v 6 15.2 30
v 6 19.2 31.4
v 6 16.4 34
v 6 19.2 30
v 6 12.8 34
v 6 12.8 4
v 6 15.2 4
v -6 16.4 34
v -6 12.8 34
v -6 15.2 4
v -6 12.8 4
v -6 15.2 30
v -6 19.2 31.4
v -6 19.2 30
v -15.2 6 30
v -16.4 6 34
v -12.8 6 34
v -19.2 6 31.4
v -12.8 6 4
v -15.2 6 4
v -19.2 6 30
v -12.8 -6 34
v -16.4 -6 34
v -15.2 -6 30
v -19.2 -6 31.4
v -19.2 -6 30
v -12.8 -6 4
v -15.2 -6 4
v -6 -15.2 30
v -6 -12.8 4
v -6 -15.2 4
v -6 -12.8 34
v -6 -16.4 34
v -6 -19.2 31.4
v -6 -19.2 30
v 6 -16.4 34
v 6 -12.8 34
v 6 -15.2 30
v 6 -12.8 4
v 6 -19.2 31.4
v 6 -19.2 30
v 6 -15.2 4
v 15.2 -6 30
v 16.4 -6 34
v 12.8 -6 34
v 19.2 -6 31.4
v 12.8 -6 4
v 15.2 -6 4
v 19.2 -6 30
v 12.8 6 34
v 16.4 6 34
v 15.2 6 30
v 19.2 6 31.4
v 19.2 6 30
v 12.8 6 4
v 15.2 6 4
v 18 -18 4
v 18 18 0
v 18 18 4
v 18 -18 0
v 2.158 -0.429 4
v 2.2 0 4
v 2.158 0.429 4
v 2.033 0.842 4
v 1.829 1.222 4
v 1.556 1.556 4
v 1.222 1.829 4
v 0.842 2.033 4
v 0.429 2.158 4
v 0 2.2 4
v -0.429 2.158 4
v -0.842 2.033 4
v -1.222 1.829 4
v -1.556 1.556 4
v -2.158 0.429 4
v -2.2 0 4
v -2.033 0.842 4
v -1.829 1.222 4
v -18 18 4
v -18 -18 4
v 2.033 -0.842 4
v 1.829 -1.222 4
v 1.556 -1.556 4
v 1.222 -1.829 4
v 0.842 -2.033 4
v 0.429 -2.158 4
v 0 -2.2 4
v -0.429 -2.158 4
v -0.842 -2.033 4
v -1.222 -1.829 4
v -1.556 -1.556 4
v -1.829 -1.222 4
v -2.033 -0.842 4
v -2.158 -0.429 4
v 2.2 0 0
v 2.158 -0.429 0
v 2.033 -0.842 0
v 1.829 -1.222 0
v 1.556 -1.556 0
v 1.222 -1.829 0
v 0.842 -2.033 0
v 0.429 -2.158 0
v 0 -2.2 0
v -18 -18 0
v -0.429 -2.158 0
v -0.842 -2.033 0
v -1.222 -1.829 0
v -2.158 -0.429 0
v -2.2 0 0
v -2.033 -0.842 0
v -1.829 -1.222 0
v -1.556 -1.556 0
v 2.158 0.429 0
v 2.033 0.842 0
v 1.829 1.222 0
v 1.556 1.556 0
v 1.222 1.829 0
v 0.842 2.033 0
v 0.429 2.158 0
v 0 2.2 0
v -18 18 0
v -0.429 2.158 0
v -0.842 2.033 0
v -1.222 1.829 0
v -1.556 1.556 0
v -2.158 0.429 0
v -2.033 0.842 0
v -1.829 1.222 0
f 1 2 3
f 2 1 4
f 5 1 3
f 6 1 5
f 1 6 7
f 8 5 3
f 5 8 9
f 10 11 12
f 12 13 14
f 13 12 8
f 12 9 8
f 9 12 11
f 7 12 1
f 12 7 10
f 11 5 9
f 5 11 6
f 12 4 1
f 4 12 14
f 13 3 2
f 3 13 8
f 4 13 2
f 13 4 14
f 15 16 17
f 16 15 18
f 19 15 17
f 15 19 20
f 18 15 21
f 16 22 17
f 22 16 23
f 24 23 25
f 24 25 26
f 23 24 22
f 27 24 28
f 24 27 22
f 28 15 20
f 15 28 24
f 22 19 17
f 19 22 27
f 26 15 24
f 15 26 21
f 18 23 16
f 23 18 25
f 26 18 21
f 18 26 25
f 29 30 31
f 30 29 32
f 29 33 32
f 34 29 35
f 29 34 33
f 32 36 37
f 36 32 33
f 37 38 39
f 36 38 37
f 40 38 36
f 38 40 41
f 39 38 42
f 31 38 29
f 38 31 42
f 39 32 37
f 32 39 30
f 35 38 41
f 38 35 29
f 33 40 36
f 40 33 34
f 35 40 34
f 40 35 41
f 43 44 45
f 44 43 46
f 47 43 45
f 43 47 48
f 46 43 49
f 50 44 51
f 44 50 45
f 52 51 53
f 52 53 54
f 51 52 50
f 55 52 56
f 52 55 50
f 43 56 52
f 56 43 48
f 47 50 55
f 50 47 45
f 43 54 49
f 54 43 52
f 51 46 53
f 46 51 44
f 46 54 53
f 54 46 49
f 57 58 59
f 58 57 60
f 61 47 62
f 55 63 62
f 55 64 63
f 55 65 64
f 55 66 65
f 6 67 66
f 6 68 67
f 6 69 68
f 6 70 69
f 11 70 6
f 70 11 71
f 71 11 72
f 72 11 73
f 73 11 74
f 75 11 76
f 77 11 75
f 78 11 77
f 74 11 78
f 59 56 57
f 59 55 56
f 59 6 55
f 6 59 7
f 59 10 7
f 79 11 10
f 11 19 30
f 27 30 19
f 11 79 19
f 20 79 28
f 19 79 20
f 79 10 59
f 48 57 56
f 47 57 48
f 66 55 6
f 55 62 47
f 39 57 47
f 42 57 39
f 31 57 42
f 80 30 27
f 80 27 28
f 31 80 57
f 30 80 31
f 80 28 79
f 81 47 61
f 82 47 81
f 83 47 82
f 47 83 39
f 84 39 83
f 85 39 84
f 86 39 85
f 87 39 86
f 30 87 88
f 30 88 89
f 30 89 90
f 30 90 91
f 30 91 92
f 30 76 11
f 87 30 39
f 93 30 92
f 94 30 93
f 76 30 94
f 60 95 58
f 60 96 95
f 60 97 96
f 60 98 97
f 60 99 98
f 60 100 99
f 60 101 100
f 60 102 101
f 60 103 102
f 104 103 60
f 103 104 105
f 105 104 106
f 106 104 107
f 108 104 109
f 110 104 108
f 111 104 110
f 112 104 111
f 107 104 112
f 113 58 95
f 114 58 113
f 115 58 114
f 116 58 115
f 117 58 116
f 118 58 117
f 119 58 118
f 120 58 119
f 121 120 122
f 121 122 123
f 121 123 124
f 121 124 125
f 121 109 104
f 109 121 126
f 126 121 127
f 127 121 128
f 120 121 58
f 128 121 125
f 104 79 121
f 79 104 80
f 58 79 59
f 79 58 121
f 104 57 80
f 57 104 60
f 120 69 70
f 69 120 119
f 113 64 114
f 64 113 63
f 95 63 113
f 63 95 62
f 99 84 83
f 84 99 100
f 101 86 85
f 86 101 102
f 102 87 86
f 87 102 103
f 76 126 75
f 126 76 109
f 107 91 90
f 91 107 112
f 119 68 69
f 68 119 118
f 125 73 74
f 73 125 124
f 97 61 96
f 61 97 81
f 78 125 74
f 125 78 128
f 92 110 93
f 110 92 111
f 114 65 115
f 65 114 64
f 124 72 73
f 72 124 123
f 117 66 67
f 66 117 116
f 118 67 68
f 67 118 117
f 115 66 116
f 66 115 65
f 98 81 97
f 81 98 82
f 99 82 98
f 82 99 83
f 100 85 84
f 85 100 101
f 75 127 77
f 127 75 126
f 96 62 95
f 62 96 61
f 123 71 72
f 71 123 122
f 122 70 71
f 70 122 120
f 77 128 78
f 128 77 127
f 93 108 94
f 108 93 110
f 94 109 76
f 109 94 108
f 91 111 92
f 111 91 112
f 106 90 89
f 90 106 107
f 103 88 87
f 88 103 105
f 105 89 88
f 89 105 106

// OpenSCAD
$fn = 32;

// ----------------------------------------------------------------------
// Snap-fit latch: 4 arms, 30 mm tall, 4.2 mm undercut hooks
// ----------------------------------------------------------------------

// --- parameters (mm) ---
base_d = 36;              // base plate depth
base_h = 4;               // base plate thickness
span = 28;                // distance between opposite arms
arm_t = 2.4;              // arm thickness
arm_d = 12;               // arm width
height = 30;              // free arm length
head_len = 4.2;           // hook reach
head_h = 4;               // hook height
lead = 1.4;               // lead-in ramp thickness
bore_d = 4.4;             // base fixing bore
top_z = 34;               // height of the arm tips above the base

arms = 4;

difference() {
  union() {
    /* base plate, centred on the arm ring */
    translate([-18, -18, 0]) cube([base_d, base_d, base_h]);
    for (a = [0 : 360 / arms : 359]) rotate([0, 0, a]) {
    /* arm, sunk 0.5 mm into the base */
    translate([-arm_d / 2, span / 2 - arm_t / 2, base_h - 0.5]) cube([arm_d, arm_t, height + 0.5]);
    /* hook: a convex hull of a tall inner block and a thin outer lip
       gives a flat undercut below and a lead-in ramp on top */
    hull() {
      translate([-arm_d / 2, span / 2 + arm_t / 2 - 0.6, top_z - head_h]) cube([arm_d, lead + 0.4, head_h]);
      translate([-arm_d / 2, span / 2 + arm_t / 2 - 0.2, top_z - head_h]) cube([arm_d, head_len, lead]);
    }
    }
  }
  translate([0, 0, -2.5]) cylinder(h = base_h + 5, d = bore_d);
}
